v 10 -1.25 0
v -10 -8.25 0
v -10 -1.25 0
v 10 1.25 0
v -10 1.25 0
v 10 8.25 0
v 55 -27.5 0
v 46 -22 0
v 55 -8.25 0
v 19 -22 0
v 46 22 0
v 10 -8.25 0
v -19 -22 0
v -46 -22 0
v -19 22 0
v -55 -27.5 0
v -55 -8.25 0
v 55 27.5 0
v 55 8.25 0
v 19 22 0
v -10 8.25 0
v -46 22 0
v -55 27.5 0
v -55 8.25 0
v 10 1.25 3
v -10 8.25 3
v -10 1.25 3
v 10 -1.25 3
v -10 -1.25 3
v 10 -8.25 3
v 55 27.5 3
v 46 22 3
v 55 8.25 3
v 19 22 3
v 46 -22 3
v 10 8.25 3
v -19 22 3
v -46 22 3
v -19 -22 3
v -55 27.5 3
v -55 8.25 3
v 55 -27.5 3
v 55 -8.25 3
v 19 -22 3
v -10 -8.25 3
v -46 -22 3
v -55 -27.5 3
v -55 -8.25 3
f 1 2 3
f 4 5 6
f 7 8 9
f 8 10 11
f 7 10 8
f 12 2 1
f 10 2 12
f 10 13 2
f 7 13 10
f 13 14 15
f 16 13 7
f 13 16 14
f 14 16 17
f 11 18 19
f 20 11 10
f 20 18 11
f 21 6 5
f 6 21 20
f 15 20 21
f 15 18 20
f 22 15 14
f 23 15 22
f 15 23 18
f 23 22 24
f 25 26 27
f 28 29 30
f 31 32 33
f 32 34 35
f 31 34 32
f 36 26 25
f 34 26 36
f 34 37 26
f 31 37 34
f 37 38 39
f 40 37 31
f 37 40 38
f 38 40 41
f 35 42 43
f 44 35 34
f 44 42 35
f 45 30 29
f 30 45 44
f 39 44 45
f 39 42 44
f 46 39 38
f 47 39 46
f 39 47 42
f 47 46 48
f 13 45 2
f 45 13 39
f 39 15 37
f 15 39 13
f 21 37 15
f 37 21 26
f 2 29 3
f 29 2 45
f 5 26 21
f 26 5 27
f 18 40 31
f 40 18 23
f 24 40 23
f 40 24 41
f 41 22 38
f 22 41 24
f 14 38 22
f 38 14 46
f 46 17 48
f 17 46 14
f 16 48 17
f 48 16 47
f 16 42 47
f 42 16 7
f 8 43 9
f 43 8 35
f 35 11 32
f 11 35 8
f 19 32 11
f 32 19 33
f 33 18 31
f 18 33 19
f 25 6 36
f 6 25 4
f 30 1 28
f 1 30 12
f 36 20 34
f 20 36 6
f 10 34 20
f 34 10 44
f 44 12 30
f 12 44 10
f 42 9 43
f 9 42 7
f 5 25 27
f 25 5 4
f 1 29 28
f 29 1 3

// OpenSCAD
// Parametric Bow Tie for Two-Color 3D Printing
// Designed for Ender 3 Pro with 0.4mm nozzle
// Conservative width design for reliable printing

// === MAIN PARAMETERS ===
bow_width_mm = 110;        // Conservative width for most bow ties
bow_height_mm = 55;        // Standard height
bow_thickness_mm = 3.0;    // Thick enough for structure, thin enough for comfort
center_knot_width_mm = 20; // Width of center knot band
strap_slot_width_mm = 22;  // Width of strap opening (allows 20mm strap + tolerance)
strap_slot_height_mm = 2.5; // Height of strap opening

// === DERIVED PARAMETERS ===
wing_width = (bow_width_mm - center_knot_width_mm) / 2;
wing_taper_start = bow_height_mm * 0.3;  // Where wings start tapering
wing_taper_end = bow_height_mm * 0.8;    // Where wings reach minimum width
min_wing_width = wing_width * 0.6;       // Minimum wing width at taper

// === RENDERING SETTINGS ===
$fn = 64;  // Smooth curves for final render

// === MAIN MODULE ===
module bow_tie() {
    difference() {
        union() {
            // Main bow wings with taper
            for (side = [-1, 1]) {
                translate([side * (center_knot_width_mm/2 + wing_width/2), 0, 0]) {
                    bow_wing();
                }
            }
            
            // Center knot band
            translate([0, 0, bow_thickness_mm/2])
                cube([center_knot_width_mm, bow_height_mm, bow_thickness_mm], center=true);
        }
        
        // Strap slot through center
        translate([0, 0, bow_thickness_mm/2])
            cube([strap_slot_width_mm, strap_slot_height_mm, bow_thickness_mm + 0.1], center=true);
    }
}

// === BOW WING MODULE ===
module bow_wing() {
    translate([0, 0, bow_thickness_mm/2]) {
        linear_extrude(height=bow_thickness_mm, center=true) {
            polygon(points=[
                // Bottom edge of wing (full width)
                [-wing_width/2, -bow_height_mm/2],
                [wing_width/2, -bow_height_mm/2],
                
                // Transition to taper start
                [wing_width/2, -wing_taper_start/2],
                
                // Taper to minimum width
                [min_wing_width/2, -wing_taper_end/2],
                [min_wing_width/2, wing_taper_end/2],
                
                // Taper back to full width
                [wing_width/2, wing_taper_start/2],
                
                // Top edge of wing (full width)  
                [wing_width/2, bow_height_mm/2],
                [-wing_width/2, bow_height_mm/2],
                
                // Repeat taper on left side
                [-wing_width/2, wing_taper_start/2],
                [-min_wing_width/2, wing_taper_end/2],
                [-min_wing_width/2, -wing_taper_end/2],
                [-wing_width/2, -wing_taper_start/2]
            ]);
        }
    }
}

// === HELPER MODULE FOR COLOR SWAP VISUALIZATION ===
module bow_tie_with_color_layers() {
    color("red") {
        intersection() {
            bow_tie();
            translate([0, 0, bow_thickness_mm * 0.33/2])
                cube([bow_width_mm + 10, bow_height_mm + 10, bow_thickness_mm * 0.33], center=true);
        }
    }
    
    color("blue") {
        difference() {
            bow_tie();
            translate([0, 0, bow_thickness_mm * 0.33/2])
                cube([bow_width_mm + 10, bow_height_mm + 10, bow_thickness_mm * 0.33], center=true);
        }
    }
}

// === MAIN RENDER ===
// Uncomment the version you want to render:

// Standard single-color version
bow_tie();

// Color visualization version (uncomment to see color split)
//bow_tie_with_color_layers();

// === INFORMATION OUTPUT ===
echo("=== BOW TIE PARAMETERS ===");
echo(str("Bow Width: ", bow_width_mm, "mm"));
echo(str("Bow Height: ", bow_height_mm, "mm"));  
echo(str("Thickness: ", bow_thickness_mm, "mm"));
echo(str("Center Knot Width: ", center_knot_width_mm, "mm"));
echo(str("Strap Slot: ", strap_slot_width_mm, "mm x ", strap_slot_height_mm, "mm"));
echo(str("Wing Width: ", wing_width, "mm"));
echo(str("Minimum Wing Width: ", min_wing_width, "mm"));

// Calculate approximate color swap layer
color_swap_height = bow_thickness_mm * 0.33;  // 33% through print
layer_height = 0.2;  // Assumed layer height
color_swap_layer = ceil(color_swap_height / layer_height);
echo(str("Suggested color swap at layer: ", color_swap_layer, " (", color_swap_height, "mm height)"));
